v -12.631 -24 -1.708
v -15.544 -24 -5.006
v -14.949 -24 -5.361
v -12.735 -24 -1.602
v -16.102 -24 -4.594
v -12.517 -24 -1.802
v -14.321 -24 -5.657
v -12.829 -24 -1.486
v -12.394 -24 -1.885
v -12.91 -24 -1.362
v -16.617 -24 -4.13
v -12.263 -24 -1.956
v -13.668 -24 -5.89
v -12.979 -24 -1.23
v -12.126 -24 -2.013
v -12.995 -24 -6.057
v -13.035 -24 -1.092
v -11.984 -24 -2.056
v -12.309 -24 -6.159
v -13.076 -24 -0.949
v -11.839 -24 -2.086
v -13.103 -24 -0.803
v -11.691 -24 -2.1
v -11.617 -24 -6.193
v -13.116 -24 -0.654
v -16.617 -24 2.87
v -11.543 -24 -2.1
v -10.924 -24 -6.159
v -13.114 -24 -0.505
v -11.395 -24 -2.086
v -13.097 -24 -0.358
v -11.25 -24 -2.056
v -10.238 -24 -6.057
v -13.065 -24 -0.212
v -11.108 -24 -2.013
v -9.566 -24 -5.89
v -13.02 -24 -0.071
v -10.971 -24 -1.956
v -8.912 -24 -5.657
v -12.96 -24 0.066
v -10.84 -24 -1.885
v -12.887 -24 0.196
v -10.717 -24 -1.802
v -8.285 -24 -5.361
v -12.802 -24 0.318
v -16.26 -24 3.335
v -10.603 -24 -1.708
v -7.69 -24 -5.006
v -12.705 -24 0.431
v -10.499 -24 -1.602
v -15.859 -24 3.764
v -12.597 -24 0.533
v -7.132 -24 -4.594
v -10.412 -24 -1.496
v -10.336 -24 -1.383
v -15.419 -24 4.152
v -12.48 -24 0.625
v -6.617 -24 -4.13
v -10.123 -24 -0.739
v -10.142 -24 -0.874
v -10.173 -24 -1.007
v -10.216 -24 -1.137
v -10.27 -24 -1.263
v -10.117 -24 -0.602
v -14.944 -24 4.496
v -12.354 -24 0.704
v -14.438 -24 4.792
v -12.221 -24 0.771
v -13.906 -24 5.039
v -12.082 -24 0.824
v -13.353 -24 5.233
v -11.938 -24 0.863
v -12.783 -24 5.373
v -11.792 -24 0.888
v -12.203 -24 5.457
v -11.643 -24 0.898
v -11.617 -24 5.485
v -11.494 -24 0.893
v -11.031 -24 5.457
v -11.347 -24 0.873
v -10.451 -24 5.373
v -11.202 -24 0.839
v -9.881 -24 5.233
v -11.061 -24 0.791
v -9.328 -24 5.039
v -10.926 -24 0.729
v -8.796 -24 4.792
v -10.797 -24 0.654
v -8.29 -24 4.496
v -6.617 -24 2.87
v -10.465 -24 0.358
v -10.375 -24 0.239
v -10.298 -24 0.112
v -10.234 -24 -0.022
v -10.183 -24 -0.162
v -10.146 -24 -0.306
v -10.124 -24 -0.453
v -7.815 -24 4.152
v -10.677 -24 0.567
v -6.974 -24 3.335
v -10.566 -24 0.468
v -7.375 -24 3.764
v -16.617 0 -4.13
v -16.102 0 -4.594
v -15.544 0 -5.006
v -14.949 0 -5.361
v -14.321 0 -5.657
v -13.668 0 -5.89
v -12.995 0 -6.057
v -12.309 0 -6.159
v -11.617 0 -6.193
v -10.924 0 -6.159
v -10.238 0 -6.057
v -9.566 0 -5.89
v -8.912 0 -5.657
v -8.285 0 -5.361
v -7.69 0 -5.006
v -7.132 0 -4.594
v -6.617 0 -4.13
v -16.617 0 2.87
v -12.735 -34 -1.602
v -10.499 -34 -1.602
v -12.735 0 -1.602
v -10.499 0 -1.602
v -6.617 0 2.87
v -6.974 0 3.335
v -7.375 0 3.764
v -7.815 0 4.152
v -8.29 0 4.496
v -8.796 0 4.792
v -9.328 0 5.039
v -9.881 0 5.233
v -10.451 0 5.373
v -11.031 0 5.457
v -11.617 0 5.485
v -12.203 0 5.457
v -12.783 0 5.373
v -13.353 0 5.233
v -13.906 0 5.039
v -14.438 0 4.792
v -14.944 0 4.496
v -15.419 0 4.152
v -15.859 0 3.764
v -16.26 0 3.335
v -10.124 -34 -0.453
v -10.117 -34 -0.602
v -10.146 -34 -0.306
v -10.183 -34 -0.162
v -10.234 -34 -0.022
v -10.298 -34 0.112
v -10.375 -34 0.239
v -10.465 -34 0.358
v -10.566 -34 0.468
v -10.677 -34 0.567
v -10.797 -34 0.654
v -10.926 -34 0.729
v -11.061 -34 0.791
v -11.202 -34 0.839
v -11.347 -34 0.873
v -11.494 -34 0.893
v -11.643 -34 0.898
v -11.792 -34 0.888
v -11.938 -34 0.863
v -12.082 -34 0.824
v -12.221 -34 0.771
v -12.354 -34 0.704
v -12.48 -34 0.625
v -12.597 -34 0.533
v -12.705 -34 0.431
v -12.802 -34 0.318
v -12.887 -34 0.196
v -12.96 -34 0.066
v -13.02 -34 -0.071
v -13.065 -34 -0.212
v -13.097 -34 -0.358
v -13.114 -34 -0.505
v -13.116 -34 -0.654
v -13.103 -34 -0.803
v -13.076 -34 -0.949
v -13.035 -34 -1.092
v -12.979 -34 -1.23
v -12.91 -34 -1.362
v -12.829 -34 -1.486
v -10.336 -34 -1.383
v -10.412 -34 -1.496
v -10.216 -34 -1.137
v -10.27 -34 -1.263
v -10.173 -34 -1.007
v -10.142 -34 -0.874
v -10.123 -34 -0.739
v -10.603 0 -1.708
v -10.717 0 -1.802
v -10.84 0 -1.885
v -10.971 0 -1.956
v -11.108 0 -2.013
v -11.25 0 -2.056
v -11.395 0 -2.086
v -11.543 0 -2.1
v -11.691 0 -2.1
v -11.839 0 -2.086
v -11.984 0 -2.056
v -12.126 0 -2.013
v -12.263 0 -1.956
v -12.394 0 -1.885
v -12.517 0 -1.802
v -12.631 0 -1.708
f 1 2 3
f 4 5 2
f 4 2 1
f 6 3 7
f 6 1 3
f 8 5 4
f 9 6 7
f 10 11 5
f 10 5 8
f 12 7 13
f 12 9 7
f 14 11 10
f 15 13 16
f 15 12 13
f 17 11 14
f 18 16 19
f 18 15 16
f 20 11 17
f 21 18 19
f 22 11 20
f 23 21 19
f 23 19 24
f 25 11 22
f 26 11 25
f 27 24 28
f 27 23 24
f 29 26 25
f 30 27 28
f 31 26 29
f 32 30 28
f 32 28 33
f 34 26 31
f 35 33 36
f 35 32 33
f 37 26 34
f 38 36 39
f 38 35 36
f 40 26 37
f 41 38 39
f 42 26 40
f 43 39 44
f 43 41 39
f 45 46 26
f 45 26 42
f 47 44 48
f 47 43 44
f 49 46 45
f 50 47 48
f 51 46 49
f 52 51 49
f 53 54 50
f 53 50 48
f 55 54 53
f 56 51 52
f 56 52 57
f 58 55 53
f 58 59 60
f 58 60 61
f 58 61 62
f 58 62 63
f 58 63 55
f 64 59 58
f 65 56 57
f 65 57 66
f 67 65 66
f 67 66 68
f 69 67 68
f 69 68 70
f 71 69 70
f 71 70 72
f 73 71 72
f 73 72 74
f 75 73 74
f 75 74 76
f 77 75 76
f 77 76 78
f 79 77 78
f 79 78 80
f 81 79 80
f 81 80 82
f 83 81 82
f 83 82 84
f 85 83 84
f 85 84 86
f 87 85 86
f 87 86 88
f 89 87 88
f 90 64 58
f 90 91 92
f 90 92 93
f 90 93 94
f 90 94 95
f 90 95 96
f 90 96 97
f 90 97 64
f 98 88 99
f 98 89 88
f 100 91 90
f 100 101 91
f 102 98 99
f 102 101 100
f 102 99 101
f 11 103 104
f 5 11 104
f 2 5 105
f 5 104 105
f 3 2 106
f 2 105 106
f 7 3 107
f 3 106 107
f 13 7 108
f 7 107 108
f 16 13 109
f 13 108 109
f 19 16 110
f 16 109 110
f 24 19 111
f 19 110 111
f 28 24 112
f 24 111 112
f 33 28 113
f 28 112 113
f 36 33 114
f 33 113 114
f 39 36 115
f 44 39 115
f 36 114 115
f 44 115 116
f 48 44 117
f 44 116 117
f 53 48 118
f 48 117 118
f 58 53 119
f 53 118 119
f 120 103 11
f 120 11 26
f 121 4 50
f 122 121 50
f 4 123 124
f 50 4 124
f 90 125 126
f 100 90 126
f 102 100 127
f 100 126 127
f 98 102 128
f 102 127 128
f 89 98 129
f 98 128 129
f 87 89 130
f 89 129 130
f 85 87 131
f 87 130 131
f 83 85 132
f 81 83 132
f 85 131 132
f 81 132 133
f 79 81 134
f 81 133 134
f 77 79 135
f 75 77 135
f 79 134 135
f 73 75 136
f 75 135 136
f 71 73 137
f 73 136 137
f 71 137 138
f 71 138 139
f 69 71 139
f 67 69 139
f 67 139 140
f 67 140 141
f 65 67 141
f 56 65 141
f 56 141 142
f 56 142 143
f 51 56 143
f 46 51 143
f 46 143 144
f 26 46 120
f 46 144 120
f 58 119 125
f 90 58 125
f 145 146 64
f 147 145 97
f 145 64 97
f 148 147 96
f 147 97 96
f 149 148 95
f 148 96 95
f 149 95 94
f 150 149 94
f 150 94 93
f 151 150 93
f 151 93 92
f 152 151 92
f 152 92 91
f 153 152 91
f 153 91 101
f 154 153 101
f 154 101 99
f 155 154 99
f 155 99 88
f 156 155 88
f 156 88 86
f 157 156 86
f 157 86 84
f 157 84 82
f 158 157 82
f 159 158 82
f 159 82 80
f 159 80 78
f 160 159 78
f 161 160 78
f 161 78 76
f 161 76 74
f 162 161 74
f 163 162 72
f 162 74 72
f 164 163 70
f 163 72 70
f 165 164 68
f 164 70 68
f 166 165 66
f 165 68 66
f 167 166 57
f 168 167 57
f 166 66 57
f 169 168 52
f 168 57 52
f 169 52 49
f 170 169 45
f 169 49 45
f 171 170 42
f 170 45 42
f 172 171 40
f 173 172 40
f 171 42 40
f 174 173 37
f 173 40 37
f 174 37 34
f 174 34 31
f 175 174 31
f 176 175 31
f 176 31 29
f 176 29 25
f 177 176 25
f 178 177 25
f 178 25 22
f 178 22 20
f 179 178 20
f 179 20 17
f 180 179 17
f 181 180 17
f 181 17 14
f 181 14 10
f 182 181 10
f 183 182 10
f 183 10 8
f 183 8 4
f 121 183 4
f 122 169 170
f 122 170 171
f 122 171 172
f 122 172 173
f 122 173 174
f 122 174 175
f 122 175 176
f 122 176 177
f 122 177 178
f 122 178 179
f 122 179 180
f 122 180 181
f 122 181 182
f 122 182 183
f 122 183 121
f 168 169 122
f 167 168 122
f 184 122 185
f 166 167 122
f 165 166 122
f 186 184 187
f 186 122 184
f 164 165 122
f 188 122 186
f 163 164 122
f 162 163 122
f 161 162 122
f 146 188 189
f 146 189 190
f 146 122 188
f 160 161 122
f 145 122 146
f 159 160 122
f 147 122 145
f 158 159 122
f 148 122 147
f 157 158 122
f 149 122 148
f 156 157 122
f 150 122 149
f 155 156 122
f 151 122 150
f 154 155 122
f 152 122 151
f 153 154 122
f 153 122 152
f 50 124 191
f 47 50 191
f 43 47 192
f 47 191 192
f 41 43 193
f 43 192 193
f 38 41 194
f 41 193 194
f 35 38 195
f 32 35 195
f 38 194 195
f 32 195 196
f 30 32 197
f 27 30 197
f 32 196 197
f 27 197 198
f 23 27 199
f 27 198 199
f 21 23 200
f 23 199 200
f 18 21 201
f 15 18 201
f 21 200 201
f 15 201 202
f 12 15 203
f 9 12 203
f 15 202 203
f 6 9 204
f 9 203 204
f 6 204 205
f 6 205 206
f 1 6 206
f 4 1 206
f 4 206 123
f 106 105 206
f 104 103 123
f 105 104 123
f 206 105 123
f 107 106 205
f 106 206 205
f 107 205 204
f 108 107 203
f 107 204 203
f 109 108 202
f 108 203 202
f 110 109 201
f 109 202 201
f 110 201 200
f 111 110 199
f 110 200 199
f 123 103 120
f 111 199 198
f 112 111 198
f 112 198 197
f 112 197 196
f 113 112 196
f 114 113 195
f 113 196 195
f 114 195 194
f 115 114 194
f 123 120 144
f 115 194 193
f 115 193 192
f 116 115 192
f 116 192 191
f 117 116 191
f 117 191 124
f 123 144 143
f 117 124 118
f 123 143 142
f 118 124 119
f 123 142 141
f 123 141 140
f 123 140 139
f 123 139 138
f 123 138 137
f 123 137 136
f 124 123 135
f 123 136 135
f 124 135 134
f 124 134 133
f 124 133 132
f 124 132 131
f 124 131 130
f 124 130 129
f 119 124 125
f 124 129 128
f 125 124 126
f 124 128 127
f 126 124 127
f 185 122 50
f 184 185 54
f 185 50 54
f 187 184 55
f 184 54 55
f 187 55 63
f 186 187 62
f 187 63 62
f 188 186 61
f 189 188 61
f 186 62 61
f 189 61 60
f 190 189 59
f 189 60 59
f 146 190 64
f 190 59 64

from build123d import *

# Parameters (mm, degrees)
F0_W     = 10
F0_H     = 7
F1_DEPTH = 24
F2_DEPTH = 34


with BuildPart() as f1:
    # F0 (on Front) → F1 (new body)
    with BuildSketch(Plane.XZ):
        with BuildLine():
            ThreePointArc((-6.6169165431, 2.8701706491), (-11.6169165431, 5.485347467), (-16.6169165431, 2.8701706491))
            Line((-16.6169165431, 2.8701706491), (-6.6169165431, 2.8701706491))
        make_face()
        with BuildLine():
            Line((-6.6169165431, -4.1298293509), (-16.6169165431, -4.1298293509))
            ThreePointArc((-16.6169165431, -4.1298293509), (-11.6169165431, -6.1927828871), (-6.6169165431, -4.1298293509))
        make_face()
        with Locations((-11.6169165431, -0.6298293509)):
            Rectangle(F0_W, F0_H)
        with BuildLine():
            ThreePointArc((-12.7349732604, -1.6020070586), (-12.1521337532, 0.7992321504), (-10.1169165431, -0.6020324705))
            ThreePointArc((-10.1169165431, -0.6020324705), (-10.2156519221, -1.1372496806), (-10.4988598258, -1.6020070586))
            ThreePointArc((-10.4988598258, -1.6020070586), (-11.6169165431, -2.1020324705), (-12.7349732604, -1.6020070586))
        make_face(mode=Mode.SUBTRACT)
    extrude(amount=F1_DEPTH)

    # F0 (on Front) → F2 (join)
    with BuildSketch(Plane.XZ):
        with BuildLine():
            ThreePointArc((-10.4988598258, -1.6020070586), (-10.2156519221, -1.1372496806), (-10.1169165431, -0.6020324705))
            ThreePointArc((-10.1169165431, -0.6020324705), (-12.1521337532, 0.7992321504), (-12.7349732604, -1.6020070586))
            Line((-12.7349732604, -1.6020070586), (-11.6097875087, -1.6020070586))
            Line((-11.6097875087, -1.6020070586), (-10.4988598258, -1.6020070586))
        make_face()
    extrude(amount=F2_DEPTH)


solid = f1.part
